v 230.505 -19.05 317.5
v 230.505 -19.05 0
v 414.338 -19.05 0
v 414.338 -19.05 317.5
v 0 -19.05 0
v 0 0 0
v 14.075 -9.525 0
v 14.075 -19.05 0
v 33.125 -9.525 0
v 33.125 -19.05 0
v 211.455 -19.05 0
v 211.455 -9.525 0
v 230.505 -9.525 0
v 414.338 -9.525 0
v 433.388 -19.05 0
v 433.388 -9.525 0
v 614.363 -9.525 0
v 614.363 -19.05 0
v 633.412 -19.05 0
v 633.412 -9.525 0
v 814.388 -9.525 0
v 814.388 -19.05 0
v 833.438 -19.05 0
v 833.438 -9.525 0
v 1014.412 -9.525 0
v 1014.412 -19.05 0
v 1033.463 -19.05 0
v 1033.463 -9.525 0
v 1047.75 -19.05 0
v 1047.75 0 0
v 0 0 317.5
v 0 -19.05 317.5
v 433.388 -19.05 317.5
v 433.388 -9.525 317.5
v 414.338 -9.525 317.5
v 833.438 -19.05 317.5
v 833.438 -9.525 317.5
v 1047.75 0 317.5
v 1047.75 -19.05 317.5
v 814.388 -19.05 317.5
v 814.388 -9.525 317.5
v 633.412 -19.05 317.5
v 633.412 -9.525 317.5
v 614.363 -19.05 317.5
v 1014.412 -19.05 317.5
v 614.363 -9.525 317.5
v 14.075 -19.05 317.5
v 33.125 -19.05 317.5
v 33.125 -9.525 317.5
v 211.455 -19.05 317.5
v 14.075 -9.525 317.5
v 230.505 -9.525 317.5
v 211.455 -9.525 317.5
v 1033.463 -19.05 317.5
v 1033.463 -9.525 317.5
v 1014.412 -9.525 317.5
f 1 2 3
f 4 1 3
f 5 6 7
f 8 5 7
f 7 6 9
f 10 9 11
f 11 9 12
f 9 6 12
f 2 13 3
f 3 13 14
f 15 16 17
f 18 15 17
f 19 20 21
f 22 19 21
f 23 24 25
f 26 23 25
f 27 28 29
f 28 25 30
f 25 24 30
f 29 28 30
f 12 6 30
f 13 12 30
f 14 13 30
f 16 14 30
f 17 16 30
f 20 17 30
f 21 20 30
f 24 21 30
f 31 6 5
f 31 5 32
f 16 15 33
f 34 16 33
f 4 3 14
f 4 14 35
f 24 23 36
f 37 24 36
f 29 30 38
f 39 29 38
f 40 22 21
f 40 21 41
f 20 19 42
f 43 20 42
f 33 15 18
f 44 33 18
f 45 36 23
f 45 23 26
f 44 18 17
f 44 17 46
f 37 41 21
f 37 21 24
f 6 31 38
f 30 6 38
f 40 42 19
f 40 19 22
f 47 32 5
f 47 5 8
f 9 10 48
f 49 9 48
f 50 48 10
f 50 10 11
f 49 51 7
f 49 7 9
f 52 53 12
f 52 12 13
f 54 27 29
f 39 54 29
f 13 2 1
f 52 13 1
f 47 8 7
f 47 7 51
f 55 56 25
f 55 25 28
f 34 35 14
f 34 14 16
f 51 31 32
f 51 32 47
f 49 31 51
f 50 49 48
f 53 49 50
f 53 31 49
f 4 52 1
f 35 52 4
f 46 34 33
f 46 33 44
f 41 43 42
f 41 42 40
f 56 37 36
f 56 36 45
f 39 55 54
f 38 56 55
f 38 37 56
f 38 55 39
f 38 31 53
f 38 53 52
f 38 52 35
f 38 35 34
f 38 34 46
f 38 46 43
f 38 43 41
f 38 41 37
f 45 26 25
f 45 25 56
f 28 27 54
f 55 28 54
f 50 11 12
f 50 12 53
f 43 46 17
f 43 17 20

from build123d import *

# Parameters (mm, degrees)
F0_W      = 1047.75
F0_H      = 317.5
F1_DEPTH  = 19.05
F2_W      = 19.05
F2_H      = 317.5
F3_DEPTH  = 9.525
F4_W      = 19.05
F4_H      = 317.5
F5_DEPTH  = 9.525
F6_W      = 19.05
F6_H      = 317.5
F7_DEPTH  = 9.525
F8_W      = 19.05
F8_H      = 317.5
F9_DEPTH  = 9.525
F10_W     = 19.05
F10_H     = 317.5
F11_DEPTH = 9.525
F12_W     = 19.05
F12_H     = 317.5
F13_DEPTH = 9.525


with BuildPart() as f1:
    # F0 (on Front) → F1 (new body)
    with BuildSketch(Plane.XZ):
        with Locations((523.875, 158.75)):
            Rectangle(F0_W, F0_H)
    extrude(amount=F1_DEPTH)

    # F2 (on face) → F3 (cut)
    with BuildSketch(Plane.XZ.offset(19.05)):
        with Locations((23.600164, 158.75)):
            Rectangle(F2_W, F2_H)
    extrude(amount=-F3_DEPTH, mode=Mode.SUBTRACT)

    # F4 (on face) → F5 (cut)
    with BuildSketch(Plane.XZ.offset(19.05)):
        with Locations((1023.9375, 158.75)):
            Rectangle(F4_W, F4_H)
    extrude(amount=-F5_DEPTH, mode=Mode.SUBTRACT)

    # F6 (on face) → F7 (cut)
    with BuildSketch(Plane.XZ.offset(19.05)):
        with Locations((823.9125, 158.75)):
            Rectangle(F6_W, F6_H)
    extrude(amount=-F7_DEPTH, mode=Mode.SUBTRACT)

    # F8 (on face) → F9 (cut)
    with BuildSketch(Plane.XZ.offset(19.05)):
        with Locations((220.98, 158.75)):
            Rectangle(F8_W, F8_H)
    extrude(amount=-F9_DEPTH, mode=Mode.SUBTRACT)

    # F10 (on face) → F11 (cut)
    with BuildSketch(Plane.XZ.offset(19.05)):
        with Locations((423.8625, 158.75)):
            Rectangle(F10_W, F10_H)
    extrude(amount=-F11_DEPTH, mode=Mode.SUBTRACT)

    # F12 (on face) → F13 (cut)
    with BuildSketch(Plane.XZ.offset(19.05)):
        with Locations((623.8875, 158.75)):
            Rectangle(F12_W, F12_H)
    extrude(amount=-F13_DEPTH, mode=Mode.SUBTRACT)


solid = f1.part
